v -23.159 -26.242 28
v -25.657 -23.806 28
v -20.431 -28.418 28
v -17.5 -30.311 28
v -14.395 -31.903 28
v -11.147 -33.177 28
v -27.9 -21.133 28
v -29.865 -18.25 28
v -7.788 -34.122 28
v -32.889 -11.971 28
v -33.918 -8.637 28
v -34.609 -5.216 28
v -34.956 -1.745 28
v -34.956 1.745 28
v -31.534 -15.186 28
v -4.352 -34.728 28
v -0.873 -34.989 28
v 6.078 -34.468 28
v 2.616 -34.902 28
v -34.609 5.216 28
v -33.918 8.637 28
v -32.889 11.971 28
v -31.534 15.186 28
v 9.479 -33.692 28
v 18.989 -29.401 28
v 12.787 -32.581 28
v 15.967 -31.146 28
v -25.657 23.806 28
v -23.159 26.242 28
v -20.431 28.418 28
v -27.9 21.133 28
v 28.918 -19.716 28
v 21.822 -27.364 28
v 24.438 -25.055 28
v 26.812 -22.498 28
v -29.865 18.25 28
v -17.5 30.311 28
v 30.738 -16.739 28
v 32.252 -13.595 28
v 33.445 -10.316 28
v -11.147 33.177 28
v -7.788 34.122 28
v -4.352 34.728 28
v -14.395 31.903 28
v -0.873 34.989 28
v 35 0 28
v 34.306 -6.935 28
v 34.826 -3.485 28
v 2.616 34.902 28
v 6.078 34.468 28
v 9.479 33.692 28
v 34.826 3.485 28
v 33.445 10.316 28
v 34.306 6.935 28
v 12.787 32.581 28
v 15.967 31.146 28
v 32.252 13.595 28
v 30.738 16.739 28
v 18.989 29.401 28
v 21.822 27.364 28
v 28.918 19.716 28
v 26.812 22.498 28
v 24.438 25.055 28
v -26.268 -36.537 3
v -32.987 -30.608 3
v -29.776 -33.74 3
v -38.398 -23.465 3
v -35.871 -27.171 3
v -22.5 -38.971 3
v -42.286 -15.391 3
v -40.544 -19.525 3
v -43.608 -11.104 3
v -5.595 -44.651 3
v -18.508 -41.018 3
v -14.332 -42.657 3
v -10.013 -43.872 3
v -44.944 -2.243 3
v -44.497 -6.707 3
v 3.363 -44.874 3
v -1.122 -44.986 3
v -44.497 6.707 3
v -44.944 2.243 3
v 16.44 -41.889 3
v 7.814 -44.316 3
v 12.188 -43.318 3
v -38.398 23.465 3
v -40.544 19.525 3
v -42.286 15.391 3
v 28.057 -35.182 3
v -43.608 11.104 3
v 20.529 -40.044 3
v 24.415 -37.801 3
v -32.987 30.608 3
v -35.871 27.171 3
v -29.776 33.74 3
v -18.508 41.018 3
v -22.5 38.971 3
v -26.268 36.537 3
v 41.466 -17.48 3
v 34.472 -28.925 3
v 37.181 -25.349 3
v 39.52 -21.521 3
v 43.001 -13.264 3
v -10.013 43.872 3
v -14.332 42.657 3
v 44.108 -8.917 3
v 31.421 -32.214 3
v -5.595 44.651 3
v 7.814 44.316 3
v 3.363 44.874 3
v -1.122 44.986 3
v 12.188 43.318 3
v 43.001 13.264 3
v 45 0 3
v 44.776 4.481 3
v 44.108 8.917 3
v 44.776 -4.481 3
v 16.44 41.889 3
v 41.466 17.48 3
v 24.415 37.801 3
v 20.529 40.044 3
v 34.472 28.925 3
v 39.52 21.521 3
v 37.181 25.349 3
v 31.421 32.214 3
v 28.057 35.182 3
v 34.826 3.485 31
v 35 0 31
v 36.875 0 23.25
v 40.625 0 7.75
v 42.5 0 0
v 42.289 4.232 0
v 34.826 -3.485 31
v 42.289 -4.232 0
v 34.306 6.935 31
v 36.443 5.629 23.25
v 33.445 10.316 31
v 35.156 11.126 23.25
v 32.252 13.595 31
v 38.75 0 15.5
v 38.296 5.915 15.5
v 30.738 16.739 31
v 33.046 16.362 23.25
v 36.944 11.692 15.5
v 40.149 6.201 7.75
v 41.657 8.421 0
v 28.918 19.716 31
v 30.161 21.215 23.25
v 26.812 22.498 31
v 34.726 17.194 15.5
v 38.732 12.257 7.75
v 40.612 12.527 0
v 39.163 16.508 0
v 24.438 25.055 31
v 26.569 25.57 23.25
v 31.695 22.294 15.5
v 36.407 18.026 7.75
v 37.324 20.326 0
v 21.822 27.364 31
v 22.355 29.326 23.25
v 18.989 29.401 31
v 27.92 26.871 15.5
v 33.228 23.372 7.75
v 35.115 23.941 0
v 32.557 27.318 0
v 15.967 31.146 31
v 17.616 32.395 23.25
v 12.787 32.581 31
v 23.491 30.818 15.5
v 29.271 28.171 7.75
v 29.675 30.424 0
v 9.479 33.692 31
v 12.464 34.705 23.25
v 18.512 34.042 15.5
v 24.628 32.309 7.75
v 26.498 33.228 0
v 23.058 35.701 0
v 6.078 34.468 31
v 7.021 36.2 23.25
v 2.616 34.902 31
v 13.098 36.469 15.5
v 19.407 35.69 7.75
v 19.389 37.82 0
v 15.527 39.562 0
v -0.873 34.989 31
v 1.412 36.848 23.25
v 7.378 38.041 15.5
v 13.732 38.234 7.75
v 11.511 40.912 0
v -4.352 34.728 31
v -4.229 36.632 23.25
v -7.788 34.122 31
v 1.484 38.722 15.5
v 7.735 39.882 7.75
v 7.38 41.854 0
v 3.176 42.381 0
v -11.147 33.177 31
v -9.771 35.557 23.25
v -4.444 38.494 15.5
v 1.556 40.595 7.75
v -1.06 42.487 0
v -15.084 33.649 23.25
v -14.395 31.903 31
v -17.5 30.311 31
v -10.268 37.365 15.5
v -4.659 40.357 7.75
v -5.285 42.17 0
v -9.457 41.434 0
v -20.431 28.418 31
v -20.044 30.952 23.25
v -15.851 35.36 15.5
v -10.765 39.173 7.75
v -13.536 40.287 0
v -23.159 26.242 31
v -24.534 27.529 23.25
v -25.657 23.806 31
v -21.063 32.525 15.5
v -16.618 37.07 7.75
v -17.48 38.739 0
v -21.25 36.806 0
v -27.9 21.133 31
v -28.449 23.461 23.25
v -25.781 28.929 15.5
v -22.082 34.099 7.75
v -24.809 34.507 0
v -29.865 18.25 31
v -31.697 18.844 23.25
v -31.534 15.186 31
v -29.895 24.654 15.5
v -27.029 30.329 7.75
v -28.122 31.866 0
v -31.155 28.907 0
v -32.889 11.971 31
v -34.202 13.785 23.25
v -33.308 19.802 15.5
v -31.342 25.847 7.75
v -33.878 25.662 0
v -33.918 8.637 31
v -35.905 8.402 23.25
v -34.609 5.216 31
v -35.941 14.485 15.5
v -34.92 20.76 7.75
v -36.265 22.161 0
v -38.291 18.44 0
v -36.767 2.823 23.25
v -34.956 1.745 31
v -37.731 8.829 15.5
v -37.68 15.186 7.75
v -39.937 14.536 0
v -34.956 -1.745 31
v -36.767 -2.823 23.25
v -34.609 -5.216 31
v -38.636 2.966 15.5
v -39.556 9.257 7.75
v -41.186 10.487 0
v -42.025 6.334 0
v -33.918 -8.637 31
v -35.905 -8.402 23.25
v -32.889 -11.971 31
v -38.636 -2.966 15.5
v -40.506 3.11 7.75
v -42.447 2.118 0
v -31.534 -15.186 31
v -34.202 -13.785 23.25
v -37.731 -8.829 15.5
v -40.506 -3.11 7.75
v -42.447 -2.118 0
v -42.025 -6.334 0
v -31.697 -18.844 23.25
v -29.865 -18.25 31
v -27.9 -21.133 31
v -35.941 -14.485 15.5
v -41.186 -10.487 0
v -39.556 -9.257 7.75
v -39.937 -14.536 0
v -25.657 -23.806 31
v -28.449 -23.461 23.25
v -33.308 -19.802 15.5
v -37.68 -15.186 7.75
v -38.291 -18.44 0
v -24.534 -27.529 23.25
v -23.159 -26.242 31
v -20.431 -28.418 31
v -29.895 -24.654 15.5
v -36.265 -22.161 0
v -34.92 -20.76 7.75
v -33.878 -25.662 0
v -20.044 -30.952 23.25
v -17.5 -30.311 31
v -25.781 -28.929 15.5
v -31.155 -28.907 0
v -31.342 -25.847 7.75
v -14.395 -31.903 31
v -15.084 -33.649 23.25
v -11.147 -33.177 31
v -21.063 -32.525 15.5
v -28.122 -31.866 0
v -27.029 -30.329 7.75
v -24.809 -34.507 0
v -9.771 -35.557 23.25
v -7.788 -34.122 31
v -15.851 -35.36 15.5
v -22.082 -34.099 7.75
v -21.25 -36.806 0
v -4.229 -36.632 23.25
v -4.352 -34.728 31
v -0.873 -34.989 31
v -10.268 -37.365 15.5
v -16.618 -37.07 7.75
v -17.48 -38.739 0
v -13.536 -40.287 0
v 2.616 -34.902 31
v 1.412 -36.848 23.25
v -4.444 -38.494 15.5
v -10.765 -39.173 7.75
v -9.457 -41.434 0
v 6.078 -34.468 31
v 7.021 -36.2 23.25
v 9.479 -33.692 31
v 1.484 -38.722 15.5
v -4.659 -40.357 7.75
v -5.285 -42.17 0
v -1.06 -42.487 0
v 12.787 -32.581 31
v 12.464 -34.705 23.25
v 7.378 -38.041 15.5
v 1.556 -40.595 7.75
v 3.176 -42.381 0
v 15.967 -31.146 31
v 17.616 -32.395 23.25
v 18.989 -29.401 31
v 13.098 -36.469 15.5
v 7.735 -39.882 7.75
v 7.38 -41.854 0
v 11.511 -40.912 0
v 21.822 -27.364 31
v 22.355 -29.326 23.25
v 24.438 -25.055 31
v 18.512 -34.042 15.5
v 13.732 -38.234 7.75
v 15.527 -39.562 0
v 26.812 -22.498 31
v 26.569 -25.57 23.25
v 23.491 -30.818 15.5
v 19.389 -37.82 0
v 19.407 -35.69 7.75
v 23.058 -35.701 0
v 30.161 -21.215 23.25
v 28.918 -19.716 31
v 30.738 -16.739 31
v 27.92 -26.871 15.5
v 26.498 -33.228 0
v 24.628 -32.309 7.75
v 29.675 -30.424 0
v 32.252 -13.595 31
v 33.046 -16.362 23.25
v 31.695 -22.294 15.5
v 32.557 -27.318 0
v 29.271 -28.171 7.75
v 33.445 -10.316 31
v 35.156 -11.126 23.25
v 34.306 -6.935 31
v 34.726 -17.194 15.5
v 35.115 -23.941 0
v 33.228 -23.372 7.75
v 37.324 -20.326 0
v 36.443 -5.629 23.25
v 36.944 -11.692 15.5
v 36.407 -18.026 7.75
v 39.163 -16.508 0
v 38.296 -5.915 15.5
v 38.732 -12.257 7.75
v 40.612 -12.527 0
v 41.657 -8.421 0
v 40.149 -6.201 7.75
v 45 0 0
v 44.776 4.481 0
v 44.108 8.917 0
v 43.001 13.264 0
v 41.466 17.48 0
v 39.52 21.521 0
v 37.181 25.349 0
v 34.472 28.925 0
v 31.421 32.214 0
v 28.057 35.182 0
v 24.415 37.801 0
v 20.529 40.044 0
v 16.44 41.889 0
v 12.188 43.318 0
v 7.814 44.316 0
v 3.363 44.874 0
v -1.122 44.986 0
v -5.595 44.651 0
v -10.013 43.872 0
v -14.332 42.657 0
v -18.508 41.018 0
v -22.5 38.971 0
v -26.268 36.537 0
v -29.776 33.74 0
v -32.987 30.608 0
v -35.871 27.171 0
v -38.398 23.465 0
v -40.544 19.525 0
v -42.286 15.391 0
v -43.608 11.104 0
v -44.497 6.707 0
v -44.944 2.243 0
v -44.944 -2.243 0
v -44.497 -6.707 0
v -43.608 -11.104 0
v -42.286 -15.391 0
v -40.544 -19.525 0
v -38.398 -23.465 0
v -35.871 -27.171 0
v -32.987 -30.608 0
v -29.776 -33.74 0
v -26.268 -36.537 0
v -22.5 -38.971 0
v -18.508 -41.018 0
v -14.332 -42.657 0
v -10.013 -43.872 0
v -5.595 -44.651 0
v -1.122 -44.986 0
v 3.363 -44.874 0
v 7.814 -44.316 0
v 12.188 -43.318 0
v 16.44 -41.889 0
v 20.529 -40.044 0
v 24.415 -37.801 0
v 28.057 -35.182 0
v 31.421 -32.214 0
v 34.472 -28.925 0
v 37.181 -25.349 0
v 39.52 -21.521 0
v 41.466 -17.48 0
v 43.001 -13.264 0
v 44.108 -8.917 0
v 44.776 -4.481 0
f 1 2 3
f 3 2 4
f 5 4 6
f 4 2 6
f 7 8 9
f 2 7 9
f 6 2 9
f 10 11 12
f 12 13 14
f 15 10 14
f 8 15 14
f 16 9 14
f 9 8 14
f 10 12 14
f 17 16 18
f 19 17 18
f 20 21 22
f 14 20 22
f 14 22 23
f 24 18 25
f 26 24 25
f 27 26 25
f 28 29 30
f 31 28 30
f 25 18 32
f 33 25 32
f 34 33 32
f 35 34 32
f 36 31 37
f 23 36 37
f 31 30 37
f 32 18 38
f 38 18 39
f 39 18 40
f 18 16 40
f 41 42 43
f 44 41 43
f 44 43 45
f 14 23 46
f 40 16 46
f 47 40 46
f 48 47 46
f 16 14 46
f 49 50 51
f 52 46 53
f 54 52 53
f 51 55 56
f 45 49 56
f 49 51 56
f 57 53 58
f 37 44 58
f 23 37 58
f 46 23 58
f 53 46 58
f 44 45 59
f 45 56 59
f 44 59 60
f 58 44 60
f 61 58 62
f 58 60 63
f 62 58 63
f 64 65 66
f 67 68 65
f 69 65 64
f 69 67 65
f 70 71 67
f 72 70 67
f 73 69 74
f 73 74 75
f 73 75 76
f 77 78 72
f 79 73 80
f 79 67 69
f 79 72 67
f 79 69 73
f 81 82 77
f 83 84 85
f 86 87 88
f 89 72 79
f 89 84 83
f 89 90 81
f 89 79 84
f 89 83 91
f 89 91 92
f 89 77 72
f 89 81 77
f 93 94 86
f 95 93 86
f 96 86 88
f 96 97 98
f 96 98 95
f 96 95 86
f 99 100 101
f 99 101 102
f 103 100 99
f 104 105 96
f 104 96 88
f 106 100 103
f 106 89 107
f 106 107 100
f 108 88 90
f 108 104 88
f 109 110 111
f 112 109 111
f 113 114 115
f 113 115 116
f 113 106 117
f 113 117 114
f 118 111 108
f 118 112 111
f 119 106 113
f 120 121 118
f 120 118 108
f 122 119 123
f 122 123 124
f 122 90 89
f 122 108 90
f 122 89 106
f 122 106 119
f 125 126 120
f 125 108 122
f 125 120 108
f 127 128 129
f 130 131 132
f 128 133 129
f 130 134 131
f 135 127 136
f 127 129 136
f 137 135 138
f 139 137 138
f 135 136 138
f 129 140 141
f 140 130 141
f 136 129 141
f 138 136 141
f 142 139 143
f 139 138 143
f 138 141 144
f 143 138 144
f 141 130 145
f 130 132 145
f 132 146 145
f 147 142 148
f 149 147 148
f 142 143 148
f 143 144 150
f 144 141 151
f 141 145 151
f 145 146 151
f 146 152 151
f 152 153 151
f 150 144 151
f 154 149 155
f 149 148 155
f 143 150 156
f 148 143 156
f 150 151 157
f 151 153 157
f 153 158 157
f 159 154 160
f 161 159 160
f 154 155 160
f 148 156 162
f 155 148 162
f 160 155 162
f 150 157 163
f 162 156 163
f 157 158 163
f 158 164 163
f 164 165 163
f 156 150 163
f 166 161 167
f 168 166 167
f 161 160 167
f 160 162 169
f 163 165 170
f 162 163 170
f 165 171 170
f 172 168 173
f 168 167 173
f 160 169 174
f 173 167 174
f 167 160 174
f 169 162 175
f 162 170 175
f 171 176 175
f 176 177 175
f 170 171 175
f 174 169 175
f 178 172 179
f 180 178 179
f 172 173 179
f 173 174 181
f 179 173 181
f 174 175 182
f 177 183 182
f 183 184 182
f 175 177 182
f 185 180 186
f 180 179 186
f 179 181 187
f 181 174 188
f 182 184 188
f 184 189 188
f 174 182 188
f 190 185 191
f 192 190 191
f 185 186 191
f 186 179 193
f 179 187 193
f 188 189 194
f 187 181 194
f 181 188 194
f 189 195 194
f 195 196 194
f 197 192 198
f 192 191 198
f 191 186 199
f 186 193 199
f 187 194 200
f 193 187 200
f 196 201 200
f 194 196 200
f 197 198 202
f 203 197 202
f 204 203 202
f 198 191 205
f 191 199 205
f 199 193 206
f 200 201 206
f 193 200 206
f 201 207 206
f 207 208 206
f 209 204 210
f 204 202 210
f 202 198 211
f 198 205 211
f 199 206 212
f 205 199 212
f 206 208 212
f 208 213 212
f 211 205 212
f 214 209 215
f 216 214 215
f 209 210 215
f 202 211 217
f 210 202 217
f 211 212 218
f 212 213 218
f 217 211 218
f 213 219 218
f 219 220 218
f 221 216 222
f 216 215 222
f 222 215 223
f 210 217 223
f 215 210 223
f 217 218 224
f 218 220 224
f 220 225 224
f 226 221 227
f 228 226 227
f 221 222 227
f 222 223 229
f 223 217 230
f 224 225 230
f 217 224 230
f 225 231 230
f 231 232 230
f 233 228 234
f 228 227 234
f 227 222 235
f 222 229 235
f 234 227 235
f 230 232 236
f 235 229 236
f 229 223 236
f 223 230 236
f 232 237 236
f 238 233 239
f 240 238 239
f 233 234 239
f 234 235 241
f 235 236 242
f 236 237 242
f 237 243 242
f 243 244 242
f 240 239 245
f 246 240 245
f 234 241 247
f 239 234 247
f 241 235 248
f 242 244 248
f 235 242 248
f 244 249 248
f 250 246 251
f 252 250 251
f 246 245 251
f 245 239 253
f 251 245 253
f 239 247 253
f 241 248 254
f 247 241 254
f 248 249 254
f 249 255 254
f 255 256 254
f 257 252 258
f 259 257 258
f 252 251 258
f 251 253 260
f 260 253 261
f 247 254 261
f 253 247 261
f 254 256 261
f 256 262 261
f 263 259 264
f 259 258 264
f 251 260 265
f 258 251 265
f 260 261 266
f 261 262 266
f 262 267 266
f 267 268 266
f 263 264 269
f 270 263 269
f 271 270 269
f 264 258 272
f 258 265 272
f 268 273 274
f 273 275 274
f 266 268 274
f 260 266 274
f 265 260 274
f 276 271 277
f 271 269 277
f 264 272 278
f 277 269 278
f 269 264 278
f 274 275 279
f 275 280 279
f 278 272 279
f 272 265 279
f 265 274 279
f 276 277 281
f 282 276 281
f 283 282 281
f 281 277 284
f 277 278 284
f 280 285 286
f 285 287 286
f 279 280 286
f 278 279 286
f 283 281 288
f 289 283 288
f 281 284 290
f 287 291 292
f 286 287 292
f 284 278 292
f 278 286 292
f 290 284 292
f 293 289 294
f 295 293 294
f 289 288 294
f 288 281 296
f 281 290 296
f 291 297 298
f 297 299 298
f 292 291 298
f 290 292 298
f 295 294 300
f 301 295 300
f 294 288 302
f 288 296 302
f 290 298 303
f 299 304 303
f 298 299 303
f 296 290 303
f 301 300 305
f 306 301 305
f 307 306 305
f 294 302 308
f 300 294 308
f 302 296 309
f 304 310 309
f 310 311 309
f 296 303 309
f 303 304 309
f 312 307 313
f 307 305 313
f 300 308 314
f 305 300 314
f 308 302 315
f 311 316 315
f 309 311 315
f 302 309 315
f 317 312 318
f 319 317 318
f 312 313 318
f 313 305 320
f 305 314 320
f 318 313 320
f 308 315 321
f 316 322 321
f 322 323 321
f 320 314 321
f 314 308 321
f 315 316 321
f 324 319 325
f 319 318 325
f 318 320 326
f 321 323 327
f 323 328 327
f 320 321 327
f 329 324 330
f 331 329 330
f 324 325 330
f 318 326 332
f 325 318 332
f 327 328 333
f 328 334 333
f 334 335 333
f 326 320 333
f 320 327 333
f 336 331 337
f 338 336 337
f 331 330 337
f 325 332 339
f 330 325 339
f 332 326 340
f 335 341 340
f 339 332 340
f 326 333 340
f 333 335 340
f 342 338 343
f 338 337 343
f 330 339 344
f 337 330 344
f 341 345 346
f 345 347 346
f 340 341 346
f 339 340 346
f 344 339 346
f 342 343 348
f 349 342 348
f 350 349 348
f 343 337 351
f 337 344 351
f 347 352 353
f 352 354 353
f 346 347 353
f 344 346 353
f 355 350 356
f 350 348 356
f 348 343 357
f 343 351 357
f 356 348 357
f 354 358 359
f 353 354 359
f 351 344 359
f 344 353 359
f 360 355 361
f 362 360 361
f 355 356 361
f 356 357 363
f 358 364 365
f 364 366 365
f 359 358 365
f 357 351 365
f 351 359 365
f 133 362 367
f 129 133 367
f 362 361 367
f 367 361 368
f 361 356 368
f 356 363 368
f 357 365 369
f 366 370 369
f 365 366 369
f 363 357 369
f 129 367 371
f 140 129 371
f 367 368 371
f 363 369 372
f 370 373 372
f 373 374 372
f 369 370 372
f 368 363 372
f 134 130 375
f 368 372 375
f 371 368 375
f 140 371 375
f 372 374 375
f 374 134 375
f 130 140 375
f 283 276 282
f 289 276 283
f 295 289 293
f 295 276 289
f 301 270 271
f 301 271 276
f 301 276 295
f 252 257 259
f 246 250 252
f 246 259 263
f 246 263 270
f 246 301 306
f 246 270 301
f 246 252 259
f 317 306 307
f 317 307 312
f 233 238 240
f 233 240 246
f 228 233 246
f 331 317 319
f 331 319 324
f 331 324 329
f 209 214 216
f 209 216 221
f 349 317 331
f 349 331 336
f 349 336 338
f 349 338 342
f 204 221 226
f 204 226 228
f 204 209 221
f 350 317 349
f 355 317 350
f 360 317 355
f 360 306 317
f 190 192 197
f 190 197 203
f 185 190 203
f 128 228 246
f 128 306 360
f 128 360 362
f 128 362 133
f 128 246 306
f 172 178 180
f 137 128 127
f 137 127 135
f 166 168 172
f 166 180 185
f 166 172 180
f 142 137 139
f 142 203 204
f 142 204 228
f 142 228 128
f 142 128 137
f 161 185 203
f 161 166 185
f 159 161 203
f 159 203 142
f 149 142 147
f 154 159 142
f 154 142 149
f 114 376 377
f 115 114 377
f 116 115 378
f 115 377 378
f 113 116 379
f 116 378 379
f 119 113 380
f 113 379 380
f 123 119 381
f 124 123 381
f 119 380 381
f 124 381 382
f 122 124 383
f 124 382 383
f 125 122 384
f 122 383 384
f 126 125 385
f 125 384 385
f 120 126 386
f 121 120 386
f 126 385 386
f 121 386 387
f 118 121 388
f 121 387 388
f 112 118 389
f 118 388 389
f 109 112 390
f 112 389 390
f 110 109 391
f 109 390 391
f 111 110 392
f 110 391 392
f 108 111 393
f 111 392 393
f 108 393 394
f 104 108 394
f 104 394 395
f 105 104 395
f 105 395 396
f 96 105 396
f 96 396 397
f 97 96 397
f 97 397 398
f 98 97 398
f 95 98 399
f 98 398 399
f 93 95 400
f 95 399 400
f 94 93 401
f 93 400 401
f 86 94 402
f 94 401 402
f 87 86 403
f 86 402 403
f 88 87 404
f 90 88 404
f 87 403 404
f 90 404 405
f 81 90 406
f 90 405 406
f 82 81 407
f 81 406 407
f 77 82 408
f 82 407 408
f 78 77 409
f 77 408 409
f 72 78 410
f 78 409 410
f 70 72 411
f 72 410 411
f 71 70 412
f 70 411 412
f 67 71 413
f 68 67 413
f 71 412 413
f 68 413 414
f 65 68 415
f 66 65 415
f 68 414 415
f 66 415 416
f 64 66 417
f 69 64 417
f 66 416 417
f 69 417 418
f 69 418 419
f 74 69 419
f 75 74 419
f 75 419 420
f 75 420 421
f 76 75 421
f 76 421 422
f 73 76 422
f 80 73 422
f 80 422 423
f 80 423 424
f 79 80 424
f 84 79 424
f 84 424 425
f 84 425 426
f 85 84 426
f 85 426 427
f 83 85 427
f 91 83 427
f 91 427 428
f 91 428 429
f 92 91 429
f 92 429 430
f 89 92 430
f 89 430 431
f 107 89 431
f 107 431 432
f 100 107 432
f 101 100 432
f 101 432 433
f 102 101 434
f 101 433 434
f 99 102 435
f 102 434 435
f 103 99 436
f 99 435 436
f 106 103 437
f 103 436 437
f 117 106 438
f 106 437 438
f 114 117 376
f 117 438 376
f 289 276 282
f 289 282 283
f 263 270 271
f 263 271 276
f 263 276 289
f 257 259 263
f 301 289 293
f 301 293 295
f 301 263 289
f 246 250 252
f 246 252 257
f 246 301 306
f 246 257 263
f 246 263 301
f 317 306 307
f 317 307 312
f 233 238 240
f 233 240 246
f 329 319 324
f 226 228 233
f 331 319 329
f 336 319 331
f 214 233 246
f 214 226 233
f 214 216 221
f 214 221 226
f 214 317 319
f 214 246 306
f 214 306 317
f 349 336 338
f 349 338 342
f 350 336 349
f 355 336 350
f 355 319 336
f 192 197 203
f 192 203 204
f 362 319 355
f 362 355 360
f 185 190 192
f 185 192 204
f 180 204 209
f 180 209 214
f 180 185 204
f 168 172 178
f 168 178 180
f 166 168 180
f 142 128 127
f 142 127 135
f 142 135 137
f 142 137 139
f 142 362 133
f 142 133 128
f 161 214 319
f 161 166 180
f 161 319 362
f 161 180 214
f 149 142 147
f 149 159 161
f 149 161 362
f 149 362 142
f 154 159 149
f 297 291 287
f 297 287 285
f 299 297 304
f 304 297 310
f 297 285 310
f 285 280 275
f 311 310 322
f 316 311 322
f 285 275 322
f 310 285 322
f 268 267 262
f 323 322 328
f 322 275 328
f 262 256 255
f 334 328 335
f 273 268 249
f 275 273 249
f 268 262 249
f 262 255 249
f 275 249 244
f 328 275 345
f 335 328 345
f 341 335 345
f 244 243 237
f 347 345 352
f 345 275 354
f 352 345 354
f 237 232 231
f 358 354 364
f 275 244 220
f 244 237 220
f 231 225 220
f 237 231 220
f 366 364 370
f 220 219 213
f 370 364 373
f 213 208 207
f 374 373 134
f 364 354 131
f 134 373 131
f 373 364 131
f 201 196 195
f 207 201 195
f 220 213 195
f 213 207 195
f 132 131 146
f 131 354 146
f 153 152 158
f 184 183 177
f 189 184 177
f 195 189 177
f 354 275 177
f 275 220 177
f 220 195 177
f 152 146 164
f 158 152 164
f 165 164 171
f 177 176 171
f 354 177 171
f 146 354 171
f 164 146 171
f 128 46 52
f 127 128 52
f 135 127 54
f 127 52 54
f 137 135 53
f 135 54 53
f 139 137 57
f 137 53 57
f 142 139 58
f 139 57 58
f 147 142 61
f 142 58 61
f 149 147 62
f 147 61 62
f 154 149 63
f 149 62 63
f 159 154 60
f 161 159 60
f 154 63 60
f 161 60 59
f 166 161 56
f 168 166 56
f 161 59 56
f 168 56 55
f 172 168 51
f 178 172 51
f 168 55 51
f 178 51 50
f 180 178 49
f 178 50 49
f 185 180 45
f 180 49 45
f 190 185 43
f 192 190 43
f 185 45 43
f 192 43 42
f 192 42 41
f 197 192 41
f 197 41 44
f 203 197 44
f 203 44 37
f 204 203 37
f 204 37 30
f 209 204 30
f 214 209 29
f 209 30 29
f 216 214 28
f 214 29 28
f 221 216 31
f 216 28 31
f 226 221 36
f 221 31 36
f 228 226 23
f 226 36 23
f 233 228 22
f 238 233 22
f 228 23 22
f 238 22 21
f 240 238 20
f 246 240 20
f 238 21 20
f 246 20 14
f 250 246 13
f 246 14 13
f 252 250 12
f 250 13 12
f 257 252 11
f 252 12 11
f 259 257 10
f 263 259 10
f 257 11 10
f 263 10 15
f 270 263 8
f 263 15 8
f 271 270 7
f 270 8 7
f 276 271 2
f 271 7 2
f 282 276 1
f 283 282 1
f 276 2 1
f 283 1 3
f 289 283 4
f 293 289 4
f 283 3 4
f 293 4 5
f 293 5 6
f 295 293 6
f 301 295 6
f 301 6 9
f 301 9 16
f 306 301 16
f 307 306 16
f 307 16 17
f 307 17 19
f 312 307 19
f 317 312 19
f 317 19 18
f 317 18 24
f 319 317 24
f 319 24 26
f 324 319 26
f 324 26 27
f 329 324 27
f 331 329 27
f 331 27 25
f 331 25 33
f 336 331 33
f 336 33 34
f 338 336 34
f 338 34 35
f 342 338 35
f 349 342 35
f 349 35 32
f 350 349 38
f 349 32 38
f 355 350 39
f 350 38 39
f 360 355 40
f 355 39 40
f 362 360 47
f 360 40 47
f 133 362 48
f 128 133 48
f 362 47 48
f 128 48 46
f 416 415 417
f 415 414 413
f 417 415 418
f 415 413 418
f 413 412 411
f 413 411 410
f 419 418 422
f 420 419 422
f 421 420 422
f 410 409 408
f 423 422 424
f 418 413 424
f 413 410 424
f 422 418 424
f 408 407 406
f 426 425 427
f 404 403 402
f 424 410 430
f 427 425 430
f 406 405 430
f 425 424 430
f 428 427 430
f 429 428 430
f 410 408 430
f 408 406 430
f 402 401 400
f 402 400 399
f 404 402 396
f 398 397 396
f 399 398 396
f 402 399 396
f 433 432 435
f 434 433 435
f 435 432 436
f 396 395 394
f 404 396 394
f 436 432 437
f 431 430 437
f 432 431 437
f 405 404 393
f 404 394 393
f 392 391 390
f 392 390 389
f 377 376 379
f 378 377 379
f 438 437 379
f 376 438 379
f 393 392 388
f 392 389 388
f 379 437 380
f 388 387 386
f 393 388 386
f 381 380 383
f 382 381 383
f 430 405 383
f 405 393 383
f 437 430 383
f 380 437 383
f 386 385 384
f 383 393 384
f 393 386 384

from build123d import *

# Parameters (mm, degrees)
F0_R      = 45
F0_R_2    = 42.5
F1_DEPTH  = 3
F3_R      = 35
F4_DEPTH  = 3
F4_FACE_R = 35


with BuildPart() as f1:
    # F0 (on Top) → F1 (new body)
    with BuildSketch(Plane.XY):
        Circle(F0_R)
        Circle(F0_R_2, mode=Mode.SUBTRACT)
        Circle(F0_R_2)
    extrude(amount=F1_DEPTH)


with BuildPart() as f4:
    # F3 (on offset) → F4 (new body)
    with BuildSketch(Plane.XY.offset(28)):
        Circle(F3_R)
    extrude(amount=F4_DEPTH)


with BuildPart() as f5:
    # F4_face (on face) → F5 section 0
    with BuildSketch(Plane.XY.offset(31)):
        Circle(F4_FACE_R)
    # F0 (on Top) → F5 section 1
    with BuildSketch(Plane.XY):
        Circle(F0_R_2)
    loft()


solid = Compound([f1.part, f4.part, f5.part])
